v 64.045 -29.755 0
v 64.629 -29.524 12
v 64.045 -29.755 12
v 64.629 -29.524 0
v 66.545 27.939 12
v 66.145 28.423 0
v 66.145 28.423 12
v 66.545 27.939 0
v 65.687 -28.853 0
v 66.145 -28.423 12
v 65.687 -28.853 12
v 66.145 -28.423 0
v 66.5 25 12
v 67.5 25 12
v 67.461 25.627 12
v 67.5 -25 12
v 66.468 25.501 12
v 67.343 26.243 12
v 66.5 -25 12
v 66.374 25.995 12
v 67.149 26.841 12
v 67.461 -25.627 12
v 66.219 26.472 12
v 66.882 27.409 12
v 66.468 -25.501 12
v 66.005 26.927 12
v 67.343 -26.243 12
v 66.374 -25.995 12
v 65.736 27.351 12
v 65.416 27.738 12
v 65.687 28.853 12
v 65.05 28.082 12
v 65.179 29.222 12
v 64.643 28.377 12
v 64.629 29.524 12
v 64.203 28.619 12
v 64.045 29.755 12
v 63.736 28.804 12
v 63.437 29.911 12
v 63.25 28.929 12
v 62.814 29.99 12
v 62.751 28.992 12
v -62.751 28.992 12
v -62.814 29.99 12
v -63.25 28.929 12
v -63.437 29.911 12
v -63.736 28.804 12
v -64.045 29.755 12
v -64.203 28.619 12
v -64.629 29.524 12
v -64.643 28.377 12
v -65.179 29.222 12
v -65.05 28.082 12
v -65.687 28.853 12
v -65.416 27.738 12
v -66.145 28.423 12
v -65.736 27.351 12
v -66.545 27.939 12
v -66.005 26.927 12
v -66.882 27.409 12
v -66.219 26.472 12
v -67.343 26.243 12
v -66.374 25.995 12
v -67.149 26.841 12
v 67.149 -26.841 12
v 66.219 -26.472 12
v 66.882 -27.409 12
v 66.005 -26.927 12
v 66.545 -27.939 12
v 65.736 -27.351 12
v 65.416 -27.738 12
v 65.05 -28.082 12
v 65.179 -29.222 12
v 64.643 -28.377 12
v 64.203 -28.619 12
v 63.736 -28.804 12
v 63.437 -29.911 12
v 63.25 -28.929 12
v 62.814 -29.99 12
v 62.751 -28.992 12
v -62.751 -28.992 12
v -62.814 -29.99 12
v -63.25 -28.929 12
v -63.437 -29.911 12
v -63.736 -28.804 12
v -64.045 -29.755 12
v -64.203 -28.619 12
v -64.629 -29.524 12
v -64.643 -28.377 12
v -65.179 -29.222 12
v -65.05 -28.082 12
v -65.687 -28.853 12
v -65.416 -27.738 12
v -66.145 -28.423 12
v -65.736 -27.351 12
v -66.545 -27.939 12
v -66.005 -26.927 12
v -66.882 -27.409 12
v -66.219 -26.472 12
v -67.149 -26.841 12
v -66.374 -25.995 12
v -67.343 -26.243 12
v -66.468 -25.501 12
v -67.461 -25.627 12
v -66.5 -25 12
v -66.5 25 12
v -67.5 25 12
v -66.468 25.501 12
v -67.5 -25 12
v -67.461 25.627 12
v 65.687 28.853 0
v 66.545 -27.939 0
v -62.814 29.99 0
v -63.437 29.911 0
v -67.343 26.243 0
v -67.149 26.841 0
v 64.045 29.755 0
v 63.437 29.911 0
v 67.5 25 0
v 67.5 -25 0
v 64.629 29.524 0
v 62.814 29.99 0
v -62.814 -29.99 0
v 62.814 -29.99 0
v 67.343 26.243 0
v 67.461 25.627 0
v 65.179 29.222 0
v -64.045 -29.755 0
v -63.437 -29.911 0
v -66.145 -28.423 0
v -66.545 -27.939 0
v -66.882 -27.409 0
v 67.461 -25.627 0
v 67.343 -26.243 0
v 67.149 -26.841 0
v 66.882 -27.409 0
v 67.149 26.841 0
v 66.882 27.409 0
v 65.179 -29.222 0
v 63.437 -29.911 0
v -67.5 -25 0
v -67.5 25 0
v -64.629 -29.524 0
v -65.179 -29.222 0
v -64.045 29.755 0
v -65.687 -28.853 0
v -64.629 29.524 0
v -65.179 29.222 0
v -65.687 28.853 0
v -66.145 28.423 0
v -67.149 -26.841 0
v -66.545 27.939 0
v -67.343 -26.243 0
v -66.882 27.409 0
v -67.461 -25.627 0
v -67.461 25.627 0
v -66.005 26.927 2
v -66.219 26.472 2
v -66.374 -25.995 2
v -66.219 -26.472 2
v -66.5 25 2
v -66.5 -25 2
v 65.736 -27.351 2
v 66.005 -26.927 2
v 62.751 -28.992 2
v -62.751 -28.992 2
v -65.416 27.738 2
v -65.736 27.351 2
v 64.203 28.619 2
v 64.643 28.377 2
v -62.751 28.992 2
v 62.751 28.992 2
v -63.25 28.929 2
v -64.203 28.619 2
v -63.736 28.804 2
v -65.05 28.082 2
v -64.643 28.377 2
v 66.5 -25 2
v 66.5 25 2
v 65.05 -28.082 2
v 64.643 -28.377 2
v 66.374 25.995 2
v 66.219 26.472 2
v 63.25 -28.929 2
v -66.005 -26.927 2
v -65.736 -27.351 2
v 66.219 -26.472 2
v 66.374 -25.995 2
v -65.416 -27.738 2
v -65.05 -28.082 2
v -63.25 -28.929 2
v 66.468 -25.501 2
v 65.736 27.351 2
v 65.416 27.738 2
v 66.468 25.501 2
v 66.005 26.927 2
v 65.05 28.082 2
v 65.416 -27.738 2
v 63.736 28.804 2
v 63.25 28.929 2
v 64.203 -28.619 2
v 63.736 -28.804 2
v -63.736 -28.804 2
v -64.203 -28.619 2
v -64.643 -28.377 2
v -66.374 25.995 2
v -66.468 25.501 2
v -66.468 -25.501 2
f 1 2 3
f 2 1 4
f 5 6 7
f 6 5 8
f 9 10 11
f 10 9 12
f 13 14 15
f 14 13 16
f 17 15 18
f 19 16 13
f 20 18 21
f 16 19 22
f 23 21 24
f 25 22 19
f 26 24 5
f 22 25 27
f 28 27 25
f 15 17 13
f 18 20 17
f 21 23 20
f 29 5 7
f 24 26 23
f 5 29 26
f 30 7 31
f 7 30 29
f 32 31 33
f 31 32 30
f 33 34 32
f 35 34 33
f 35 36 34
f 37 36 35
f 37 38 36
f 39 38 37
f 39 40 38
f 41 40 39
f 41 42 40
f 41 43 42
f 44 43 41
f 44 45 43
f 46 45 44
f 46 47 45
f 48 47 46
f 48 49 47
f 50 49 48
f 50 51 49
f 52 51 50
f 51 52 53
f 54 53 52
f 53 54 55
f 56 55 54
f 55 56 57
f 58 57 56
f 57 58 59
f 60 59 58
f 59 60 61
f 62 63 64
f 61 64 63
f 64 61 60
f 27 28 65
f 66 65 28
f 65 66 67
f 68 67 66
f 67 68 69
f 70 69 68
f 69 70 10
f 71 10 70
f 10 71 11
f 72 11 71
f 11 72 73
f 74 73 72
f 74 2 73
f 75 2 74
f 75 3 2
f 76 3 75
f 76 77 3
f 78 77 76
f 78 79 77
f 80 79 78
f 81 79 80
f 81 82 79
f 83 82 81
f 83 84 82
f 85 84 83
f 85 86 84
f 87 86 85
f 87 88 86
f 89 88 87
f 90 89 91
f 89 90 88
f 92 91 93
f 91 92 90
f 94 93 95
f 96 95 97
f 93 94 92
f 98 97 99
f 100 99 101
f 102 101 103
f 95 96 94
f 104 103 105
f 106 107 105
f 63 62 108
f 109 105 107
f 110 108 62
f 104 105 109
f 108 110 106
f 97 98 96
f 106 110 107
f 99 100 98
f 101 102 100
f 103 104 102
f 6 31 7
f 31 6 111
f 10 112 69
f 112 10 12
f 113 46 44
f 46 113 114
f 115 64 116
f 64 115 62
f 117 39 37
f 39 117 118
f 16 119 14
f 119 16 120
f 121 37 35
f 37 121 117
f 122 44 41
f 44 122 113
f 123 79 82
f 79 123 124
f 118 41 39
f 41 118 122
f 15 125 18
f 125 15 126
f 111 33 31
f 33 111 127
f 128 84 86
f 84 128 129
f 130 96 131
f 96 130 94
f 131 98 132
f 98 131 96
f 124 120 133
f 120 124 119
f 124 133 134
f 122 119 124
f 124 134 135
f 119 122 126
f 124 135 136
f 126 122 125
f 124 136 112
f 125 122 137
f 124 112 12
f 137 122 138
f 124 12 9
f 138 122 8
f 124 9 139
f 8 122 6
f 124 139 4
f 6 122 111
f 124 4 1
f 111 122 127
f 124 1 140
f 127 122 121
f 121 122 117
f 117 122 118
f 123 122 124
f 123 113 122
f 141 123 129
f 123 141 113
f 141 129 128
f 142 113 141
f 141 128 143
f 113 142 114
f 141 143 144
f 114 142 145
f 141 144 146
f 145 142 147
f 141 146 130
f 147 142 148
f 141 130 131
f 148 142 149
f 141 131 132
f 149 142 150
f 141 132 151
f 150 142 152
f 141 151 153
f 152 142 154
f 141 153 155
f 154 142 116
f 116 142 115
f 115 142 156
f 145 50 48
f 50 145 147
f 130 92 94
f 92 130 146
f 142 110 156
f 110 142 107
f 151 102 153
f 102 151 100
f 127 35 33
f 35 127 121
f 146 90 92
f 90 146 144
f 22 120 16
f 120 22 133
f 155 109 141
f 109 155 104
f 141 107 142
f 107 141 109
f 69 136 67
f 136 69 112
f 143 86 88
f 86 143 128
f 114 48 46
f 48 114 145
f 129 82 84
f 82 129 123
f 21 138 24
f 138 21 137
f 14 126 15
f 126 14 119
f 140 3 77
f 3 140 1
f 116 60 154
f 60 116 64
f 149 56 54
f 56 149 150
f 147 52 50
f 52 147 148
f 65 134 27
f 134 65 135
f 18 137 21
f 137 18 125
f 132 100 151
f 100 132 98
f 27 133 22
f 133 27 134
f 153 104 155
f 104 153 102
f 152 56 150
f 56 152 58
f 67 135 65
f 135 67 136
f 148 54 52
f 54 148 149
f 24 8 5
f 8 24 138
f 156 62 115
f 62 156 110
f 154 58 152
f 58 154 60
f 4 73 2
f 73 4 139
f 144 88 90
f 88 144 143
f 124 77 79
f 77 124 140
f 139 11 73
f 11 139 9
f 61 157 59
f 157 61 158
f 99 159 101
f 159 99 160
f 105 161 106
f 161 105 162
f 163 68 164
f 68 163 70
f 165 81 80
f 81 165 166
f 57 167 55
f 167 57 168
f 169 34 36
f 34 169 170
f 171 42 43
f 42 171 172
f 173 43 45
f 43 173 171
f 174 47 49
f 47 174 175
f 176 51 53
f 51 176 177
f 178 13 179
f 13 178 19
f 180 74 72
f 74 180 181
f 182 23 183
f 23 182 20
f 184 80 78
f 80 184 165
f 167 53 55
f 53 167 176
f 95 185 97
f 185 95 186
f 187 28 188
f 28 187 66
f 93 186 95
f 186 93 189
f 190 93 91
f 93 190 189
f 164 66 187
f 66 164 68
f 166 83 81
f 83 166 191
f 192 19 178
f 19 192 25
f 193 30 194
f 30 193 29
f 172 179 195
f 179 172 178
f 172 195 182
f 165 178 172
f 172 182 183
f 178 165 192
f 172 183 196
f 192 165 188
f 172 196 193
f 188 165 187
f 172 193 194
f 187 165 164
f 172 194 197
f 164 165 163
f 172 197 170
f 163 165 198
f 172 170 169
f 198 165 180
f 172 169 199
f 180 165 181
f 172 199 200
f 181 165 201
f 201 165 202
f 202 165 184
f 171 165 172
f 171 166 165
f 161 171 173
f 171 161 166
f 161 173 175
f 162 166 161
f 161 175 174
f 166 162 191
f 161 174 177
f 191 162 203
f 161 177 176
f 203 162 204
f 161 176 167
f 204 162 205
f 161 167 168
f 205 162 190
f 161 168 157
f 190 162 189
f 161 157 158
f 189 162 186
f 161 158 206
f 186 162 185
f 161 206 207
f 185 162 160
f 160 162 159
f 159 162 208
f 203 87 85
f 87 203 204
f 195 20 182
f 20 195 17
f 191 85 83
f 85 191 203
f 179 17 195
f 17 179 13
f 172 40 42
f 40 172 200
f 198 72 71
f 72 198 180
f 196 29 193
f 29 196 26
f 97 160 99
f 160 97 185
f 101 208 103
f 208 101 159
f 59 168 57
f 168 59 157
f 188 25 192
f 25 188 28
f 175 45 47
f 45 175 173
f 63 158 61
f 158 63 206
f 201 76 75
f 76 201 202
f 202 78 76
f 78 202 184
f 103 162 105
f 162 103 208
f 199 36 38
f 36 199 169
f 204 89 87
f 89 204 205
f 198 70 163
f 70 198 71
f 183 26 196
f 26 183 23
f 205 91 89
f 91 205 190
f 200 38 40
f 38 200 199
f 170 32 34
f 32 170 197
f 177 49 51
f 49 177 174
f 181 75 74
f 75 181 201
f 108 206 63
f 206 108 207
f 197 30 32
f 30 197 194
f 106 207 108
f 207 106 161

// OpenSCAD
$fn = 50;


difference() {
	union() {
		hull() {
			translate(v = [-62.5000000000, 25.0000000000, 0]) {
				cylinder(h = 12, r = 5);
			}
			translate(v = [62.5000000000, 25.0000000000, 0]) {
				cylinder(h = 12, r = 5);
			}
			translate(v = [-62.5000000000, -25.0000000000, 0]) {
				cylinder(h = 12, r = 5);
			}
			translate(v = [62.5000000000, -25.0000000000, 0]) {
				cylinder(h = 12, r = 5);
			}
		}
	}
	union() {
		translate(v = [0, 0, 2]) {
			hull() {
				translate(v = [-62.5000000000, 25.0000000000, 0]) {
					cylinder(h = 10, r = 4);
				}
				translate(v = [62.5000000000, 25.0000000000, 0]) {
					cylinder(h = 10, r = 4);
				}
				translate(v = [-62.5000000000, -25.0000000000, 0]) {
					cylinder(h = 10, r = 4);
				}
				translate(v = [62.5000000000, -25.0000000000, 0]) {
					cylinder(h = 10, r = 4);
				}
			}
		}
	}
}
